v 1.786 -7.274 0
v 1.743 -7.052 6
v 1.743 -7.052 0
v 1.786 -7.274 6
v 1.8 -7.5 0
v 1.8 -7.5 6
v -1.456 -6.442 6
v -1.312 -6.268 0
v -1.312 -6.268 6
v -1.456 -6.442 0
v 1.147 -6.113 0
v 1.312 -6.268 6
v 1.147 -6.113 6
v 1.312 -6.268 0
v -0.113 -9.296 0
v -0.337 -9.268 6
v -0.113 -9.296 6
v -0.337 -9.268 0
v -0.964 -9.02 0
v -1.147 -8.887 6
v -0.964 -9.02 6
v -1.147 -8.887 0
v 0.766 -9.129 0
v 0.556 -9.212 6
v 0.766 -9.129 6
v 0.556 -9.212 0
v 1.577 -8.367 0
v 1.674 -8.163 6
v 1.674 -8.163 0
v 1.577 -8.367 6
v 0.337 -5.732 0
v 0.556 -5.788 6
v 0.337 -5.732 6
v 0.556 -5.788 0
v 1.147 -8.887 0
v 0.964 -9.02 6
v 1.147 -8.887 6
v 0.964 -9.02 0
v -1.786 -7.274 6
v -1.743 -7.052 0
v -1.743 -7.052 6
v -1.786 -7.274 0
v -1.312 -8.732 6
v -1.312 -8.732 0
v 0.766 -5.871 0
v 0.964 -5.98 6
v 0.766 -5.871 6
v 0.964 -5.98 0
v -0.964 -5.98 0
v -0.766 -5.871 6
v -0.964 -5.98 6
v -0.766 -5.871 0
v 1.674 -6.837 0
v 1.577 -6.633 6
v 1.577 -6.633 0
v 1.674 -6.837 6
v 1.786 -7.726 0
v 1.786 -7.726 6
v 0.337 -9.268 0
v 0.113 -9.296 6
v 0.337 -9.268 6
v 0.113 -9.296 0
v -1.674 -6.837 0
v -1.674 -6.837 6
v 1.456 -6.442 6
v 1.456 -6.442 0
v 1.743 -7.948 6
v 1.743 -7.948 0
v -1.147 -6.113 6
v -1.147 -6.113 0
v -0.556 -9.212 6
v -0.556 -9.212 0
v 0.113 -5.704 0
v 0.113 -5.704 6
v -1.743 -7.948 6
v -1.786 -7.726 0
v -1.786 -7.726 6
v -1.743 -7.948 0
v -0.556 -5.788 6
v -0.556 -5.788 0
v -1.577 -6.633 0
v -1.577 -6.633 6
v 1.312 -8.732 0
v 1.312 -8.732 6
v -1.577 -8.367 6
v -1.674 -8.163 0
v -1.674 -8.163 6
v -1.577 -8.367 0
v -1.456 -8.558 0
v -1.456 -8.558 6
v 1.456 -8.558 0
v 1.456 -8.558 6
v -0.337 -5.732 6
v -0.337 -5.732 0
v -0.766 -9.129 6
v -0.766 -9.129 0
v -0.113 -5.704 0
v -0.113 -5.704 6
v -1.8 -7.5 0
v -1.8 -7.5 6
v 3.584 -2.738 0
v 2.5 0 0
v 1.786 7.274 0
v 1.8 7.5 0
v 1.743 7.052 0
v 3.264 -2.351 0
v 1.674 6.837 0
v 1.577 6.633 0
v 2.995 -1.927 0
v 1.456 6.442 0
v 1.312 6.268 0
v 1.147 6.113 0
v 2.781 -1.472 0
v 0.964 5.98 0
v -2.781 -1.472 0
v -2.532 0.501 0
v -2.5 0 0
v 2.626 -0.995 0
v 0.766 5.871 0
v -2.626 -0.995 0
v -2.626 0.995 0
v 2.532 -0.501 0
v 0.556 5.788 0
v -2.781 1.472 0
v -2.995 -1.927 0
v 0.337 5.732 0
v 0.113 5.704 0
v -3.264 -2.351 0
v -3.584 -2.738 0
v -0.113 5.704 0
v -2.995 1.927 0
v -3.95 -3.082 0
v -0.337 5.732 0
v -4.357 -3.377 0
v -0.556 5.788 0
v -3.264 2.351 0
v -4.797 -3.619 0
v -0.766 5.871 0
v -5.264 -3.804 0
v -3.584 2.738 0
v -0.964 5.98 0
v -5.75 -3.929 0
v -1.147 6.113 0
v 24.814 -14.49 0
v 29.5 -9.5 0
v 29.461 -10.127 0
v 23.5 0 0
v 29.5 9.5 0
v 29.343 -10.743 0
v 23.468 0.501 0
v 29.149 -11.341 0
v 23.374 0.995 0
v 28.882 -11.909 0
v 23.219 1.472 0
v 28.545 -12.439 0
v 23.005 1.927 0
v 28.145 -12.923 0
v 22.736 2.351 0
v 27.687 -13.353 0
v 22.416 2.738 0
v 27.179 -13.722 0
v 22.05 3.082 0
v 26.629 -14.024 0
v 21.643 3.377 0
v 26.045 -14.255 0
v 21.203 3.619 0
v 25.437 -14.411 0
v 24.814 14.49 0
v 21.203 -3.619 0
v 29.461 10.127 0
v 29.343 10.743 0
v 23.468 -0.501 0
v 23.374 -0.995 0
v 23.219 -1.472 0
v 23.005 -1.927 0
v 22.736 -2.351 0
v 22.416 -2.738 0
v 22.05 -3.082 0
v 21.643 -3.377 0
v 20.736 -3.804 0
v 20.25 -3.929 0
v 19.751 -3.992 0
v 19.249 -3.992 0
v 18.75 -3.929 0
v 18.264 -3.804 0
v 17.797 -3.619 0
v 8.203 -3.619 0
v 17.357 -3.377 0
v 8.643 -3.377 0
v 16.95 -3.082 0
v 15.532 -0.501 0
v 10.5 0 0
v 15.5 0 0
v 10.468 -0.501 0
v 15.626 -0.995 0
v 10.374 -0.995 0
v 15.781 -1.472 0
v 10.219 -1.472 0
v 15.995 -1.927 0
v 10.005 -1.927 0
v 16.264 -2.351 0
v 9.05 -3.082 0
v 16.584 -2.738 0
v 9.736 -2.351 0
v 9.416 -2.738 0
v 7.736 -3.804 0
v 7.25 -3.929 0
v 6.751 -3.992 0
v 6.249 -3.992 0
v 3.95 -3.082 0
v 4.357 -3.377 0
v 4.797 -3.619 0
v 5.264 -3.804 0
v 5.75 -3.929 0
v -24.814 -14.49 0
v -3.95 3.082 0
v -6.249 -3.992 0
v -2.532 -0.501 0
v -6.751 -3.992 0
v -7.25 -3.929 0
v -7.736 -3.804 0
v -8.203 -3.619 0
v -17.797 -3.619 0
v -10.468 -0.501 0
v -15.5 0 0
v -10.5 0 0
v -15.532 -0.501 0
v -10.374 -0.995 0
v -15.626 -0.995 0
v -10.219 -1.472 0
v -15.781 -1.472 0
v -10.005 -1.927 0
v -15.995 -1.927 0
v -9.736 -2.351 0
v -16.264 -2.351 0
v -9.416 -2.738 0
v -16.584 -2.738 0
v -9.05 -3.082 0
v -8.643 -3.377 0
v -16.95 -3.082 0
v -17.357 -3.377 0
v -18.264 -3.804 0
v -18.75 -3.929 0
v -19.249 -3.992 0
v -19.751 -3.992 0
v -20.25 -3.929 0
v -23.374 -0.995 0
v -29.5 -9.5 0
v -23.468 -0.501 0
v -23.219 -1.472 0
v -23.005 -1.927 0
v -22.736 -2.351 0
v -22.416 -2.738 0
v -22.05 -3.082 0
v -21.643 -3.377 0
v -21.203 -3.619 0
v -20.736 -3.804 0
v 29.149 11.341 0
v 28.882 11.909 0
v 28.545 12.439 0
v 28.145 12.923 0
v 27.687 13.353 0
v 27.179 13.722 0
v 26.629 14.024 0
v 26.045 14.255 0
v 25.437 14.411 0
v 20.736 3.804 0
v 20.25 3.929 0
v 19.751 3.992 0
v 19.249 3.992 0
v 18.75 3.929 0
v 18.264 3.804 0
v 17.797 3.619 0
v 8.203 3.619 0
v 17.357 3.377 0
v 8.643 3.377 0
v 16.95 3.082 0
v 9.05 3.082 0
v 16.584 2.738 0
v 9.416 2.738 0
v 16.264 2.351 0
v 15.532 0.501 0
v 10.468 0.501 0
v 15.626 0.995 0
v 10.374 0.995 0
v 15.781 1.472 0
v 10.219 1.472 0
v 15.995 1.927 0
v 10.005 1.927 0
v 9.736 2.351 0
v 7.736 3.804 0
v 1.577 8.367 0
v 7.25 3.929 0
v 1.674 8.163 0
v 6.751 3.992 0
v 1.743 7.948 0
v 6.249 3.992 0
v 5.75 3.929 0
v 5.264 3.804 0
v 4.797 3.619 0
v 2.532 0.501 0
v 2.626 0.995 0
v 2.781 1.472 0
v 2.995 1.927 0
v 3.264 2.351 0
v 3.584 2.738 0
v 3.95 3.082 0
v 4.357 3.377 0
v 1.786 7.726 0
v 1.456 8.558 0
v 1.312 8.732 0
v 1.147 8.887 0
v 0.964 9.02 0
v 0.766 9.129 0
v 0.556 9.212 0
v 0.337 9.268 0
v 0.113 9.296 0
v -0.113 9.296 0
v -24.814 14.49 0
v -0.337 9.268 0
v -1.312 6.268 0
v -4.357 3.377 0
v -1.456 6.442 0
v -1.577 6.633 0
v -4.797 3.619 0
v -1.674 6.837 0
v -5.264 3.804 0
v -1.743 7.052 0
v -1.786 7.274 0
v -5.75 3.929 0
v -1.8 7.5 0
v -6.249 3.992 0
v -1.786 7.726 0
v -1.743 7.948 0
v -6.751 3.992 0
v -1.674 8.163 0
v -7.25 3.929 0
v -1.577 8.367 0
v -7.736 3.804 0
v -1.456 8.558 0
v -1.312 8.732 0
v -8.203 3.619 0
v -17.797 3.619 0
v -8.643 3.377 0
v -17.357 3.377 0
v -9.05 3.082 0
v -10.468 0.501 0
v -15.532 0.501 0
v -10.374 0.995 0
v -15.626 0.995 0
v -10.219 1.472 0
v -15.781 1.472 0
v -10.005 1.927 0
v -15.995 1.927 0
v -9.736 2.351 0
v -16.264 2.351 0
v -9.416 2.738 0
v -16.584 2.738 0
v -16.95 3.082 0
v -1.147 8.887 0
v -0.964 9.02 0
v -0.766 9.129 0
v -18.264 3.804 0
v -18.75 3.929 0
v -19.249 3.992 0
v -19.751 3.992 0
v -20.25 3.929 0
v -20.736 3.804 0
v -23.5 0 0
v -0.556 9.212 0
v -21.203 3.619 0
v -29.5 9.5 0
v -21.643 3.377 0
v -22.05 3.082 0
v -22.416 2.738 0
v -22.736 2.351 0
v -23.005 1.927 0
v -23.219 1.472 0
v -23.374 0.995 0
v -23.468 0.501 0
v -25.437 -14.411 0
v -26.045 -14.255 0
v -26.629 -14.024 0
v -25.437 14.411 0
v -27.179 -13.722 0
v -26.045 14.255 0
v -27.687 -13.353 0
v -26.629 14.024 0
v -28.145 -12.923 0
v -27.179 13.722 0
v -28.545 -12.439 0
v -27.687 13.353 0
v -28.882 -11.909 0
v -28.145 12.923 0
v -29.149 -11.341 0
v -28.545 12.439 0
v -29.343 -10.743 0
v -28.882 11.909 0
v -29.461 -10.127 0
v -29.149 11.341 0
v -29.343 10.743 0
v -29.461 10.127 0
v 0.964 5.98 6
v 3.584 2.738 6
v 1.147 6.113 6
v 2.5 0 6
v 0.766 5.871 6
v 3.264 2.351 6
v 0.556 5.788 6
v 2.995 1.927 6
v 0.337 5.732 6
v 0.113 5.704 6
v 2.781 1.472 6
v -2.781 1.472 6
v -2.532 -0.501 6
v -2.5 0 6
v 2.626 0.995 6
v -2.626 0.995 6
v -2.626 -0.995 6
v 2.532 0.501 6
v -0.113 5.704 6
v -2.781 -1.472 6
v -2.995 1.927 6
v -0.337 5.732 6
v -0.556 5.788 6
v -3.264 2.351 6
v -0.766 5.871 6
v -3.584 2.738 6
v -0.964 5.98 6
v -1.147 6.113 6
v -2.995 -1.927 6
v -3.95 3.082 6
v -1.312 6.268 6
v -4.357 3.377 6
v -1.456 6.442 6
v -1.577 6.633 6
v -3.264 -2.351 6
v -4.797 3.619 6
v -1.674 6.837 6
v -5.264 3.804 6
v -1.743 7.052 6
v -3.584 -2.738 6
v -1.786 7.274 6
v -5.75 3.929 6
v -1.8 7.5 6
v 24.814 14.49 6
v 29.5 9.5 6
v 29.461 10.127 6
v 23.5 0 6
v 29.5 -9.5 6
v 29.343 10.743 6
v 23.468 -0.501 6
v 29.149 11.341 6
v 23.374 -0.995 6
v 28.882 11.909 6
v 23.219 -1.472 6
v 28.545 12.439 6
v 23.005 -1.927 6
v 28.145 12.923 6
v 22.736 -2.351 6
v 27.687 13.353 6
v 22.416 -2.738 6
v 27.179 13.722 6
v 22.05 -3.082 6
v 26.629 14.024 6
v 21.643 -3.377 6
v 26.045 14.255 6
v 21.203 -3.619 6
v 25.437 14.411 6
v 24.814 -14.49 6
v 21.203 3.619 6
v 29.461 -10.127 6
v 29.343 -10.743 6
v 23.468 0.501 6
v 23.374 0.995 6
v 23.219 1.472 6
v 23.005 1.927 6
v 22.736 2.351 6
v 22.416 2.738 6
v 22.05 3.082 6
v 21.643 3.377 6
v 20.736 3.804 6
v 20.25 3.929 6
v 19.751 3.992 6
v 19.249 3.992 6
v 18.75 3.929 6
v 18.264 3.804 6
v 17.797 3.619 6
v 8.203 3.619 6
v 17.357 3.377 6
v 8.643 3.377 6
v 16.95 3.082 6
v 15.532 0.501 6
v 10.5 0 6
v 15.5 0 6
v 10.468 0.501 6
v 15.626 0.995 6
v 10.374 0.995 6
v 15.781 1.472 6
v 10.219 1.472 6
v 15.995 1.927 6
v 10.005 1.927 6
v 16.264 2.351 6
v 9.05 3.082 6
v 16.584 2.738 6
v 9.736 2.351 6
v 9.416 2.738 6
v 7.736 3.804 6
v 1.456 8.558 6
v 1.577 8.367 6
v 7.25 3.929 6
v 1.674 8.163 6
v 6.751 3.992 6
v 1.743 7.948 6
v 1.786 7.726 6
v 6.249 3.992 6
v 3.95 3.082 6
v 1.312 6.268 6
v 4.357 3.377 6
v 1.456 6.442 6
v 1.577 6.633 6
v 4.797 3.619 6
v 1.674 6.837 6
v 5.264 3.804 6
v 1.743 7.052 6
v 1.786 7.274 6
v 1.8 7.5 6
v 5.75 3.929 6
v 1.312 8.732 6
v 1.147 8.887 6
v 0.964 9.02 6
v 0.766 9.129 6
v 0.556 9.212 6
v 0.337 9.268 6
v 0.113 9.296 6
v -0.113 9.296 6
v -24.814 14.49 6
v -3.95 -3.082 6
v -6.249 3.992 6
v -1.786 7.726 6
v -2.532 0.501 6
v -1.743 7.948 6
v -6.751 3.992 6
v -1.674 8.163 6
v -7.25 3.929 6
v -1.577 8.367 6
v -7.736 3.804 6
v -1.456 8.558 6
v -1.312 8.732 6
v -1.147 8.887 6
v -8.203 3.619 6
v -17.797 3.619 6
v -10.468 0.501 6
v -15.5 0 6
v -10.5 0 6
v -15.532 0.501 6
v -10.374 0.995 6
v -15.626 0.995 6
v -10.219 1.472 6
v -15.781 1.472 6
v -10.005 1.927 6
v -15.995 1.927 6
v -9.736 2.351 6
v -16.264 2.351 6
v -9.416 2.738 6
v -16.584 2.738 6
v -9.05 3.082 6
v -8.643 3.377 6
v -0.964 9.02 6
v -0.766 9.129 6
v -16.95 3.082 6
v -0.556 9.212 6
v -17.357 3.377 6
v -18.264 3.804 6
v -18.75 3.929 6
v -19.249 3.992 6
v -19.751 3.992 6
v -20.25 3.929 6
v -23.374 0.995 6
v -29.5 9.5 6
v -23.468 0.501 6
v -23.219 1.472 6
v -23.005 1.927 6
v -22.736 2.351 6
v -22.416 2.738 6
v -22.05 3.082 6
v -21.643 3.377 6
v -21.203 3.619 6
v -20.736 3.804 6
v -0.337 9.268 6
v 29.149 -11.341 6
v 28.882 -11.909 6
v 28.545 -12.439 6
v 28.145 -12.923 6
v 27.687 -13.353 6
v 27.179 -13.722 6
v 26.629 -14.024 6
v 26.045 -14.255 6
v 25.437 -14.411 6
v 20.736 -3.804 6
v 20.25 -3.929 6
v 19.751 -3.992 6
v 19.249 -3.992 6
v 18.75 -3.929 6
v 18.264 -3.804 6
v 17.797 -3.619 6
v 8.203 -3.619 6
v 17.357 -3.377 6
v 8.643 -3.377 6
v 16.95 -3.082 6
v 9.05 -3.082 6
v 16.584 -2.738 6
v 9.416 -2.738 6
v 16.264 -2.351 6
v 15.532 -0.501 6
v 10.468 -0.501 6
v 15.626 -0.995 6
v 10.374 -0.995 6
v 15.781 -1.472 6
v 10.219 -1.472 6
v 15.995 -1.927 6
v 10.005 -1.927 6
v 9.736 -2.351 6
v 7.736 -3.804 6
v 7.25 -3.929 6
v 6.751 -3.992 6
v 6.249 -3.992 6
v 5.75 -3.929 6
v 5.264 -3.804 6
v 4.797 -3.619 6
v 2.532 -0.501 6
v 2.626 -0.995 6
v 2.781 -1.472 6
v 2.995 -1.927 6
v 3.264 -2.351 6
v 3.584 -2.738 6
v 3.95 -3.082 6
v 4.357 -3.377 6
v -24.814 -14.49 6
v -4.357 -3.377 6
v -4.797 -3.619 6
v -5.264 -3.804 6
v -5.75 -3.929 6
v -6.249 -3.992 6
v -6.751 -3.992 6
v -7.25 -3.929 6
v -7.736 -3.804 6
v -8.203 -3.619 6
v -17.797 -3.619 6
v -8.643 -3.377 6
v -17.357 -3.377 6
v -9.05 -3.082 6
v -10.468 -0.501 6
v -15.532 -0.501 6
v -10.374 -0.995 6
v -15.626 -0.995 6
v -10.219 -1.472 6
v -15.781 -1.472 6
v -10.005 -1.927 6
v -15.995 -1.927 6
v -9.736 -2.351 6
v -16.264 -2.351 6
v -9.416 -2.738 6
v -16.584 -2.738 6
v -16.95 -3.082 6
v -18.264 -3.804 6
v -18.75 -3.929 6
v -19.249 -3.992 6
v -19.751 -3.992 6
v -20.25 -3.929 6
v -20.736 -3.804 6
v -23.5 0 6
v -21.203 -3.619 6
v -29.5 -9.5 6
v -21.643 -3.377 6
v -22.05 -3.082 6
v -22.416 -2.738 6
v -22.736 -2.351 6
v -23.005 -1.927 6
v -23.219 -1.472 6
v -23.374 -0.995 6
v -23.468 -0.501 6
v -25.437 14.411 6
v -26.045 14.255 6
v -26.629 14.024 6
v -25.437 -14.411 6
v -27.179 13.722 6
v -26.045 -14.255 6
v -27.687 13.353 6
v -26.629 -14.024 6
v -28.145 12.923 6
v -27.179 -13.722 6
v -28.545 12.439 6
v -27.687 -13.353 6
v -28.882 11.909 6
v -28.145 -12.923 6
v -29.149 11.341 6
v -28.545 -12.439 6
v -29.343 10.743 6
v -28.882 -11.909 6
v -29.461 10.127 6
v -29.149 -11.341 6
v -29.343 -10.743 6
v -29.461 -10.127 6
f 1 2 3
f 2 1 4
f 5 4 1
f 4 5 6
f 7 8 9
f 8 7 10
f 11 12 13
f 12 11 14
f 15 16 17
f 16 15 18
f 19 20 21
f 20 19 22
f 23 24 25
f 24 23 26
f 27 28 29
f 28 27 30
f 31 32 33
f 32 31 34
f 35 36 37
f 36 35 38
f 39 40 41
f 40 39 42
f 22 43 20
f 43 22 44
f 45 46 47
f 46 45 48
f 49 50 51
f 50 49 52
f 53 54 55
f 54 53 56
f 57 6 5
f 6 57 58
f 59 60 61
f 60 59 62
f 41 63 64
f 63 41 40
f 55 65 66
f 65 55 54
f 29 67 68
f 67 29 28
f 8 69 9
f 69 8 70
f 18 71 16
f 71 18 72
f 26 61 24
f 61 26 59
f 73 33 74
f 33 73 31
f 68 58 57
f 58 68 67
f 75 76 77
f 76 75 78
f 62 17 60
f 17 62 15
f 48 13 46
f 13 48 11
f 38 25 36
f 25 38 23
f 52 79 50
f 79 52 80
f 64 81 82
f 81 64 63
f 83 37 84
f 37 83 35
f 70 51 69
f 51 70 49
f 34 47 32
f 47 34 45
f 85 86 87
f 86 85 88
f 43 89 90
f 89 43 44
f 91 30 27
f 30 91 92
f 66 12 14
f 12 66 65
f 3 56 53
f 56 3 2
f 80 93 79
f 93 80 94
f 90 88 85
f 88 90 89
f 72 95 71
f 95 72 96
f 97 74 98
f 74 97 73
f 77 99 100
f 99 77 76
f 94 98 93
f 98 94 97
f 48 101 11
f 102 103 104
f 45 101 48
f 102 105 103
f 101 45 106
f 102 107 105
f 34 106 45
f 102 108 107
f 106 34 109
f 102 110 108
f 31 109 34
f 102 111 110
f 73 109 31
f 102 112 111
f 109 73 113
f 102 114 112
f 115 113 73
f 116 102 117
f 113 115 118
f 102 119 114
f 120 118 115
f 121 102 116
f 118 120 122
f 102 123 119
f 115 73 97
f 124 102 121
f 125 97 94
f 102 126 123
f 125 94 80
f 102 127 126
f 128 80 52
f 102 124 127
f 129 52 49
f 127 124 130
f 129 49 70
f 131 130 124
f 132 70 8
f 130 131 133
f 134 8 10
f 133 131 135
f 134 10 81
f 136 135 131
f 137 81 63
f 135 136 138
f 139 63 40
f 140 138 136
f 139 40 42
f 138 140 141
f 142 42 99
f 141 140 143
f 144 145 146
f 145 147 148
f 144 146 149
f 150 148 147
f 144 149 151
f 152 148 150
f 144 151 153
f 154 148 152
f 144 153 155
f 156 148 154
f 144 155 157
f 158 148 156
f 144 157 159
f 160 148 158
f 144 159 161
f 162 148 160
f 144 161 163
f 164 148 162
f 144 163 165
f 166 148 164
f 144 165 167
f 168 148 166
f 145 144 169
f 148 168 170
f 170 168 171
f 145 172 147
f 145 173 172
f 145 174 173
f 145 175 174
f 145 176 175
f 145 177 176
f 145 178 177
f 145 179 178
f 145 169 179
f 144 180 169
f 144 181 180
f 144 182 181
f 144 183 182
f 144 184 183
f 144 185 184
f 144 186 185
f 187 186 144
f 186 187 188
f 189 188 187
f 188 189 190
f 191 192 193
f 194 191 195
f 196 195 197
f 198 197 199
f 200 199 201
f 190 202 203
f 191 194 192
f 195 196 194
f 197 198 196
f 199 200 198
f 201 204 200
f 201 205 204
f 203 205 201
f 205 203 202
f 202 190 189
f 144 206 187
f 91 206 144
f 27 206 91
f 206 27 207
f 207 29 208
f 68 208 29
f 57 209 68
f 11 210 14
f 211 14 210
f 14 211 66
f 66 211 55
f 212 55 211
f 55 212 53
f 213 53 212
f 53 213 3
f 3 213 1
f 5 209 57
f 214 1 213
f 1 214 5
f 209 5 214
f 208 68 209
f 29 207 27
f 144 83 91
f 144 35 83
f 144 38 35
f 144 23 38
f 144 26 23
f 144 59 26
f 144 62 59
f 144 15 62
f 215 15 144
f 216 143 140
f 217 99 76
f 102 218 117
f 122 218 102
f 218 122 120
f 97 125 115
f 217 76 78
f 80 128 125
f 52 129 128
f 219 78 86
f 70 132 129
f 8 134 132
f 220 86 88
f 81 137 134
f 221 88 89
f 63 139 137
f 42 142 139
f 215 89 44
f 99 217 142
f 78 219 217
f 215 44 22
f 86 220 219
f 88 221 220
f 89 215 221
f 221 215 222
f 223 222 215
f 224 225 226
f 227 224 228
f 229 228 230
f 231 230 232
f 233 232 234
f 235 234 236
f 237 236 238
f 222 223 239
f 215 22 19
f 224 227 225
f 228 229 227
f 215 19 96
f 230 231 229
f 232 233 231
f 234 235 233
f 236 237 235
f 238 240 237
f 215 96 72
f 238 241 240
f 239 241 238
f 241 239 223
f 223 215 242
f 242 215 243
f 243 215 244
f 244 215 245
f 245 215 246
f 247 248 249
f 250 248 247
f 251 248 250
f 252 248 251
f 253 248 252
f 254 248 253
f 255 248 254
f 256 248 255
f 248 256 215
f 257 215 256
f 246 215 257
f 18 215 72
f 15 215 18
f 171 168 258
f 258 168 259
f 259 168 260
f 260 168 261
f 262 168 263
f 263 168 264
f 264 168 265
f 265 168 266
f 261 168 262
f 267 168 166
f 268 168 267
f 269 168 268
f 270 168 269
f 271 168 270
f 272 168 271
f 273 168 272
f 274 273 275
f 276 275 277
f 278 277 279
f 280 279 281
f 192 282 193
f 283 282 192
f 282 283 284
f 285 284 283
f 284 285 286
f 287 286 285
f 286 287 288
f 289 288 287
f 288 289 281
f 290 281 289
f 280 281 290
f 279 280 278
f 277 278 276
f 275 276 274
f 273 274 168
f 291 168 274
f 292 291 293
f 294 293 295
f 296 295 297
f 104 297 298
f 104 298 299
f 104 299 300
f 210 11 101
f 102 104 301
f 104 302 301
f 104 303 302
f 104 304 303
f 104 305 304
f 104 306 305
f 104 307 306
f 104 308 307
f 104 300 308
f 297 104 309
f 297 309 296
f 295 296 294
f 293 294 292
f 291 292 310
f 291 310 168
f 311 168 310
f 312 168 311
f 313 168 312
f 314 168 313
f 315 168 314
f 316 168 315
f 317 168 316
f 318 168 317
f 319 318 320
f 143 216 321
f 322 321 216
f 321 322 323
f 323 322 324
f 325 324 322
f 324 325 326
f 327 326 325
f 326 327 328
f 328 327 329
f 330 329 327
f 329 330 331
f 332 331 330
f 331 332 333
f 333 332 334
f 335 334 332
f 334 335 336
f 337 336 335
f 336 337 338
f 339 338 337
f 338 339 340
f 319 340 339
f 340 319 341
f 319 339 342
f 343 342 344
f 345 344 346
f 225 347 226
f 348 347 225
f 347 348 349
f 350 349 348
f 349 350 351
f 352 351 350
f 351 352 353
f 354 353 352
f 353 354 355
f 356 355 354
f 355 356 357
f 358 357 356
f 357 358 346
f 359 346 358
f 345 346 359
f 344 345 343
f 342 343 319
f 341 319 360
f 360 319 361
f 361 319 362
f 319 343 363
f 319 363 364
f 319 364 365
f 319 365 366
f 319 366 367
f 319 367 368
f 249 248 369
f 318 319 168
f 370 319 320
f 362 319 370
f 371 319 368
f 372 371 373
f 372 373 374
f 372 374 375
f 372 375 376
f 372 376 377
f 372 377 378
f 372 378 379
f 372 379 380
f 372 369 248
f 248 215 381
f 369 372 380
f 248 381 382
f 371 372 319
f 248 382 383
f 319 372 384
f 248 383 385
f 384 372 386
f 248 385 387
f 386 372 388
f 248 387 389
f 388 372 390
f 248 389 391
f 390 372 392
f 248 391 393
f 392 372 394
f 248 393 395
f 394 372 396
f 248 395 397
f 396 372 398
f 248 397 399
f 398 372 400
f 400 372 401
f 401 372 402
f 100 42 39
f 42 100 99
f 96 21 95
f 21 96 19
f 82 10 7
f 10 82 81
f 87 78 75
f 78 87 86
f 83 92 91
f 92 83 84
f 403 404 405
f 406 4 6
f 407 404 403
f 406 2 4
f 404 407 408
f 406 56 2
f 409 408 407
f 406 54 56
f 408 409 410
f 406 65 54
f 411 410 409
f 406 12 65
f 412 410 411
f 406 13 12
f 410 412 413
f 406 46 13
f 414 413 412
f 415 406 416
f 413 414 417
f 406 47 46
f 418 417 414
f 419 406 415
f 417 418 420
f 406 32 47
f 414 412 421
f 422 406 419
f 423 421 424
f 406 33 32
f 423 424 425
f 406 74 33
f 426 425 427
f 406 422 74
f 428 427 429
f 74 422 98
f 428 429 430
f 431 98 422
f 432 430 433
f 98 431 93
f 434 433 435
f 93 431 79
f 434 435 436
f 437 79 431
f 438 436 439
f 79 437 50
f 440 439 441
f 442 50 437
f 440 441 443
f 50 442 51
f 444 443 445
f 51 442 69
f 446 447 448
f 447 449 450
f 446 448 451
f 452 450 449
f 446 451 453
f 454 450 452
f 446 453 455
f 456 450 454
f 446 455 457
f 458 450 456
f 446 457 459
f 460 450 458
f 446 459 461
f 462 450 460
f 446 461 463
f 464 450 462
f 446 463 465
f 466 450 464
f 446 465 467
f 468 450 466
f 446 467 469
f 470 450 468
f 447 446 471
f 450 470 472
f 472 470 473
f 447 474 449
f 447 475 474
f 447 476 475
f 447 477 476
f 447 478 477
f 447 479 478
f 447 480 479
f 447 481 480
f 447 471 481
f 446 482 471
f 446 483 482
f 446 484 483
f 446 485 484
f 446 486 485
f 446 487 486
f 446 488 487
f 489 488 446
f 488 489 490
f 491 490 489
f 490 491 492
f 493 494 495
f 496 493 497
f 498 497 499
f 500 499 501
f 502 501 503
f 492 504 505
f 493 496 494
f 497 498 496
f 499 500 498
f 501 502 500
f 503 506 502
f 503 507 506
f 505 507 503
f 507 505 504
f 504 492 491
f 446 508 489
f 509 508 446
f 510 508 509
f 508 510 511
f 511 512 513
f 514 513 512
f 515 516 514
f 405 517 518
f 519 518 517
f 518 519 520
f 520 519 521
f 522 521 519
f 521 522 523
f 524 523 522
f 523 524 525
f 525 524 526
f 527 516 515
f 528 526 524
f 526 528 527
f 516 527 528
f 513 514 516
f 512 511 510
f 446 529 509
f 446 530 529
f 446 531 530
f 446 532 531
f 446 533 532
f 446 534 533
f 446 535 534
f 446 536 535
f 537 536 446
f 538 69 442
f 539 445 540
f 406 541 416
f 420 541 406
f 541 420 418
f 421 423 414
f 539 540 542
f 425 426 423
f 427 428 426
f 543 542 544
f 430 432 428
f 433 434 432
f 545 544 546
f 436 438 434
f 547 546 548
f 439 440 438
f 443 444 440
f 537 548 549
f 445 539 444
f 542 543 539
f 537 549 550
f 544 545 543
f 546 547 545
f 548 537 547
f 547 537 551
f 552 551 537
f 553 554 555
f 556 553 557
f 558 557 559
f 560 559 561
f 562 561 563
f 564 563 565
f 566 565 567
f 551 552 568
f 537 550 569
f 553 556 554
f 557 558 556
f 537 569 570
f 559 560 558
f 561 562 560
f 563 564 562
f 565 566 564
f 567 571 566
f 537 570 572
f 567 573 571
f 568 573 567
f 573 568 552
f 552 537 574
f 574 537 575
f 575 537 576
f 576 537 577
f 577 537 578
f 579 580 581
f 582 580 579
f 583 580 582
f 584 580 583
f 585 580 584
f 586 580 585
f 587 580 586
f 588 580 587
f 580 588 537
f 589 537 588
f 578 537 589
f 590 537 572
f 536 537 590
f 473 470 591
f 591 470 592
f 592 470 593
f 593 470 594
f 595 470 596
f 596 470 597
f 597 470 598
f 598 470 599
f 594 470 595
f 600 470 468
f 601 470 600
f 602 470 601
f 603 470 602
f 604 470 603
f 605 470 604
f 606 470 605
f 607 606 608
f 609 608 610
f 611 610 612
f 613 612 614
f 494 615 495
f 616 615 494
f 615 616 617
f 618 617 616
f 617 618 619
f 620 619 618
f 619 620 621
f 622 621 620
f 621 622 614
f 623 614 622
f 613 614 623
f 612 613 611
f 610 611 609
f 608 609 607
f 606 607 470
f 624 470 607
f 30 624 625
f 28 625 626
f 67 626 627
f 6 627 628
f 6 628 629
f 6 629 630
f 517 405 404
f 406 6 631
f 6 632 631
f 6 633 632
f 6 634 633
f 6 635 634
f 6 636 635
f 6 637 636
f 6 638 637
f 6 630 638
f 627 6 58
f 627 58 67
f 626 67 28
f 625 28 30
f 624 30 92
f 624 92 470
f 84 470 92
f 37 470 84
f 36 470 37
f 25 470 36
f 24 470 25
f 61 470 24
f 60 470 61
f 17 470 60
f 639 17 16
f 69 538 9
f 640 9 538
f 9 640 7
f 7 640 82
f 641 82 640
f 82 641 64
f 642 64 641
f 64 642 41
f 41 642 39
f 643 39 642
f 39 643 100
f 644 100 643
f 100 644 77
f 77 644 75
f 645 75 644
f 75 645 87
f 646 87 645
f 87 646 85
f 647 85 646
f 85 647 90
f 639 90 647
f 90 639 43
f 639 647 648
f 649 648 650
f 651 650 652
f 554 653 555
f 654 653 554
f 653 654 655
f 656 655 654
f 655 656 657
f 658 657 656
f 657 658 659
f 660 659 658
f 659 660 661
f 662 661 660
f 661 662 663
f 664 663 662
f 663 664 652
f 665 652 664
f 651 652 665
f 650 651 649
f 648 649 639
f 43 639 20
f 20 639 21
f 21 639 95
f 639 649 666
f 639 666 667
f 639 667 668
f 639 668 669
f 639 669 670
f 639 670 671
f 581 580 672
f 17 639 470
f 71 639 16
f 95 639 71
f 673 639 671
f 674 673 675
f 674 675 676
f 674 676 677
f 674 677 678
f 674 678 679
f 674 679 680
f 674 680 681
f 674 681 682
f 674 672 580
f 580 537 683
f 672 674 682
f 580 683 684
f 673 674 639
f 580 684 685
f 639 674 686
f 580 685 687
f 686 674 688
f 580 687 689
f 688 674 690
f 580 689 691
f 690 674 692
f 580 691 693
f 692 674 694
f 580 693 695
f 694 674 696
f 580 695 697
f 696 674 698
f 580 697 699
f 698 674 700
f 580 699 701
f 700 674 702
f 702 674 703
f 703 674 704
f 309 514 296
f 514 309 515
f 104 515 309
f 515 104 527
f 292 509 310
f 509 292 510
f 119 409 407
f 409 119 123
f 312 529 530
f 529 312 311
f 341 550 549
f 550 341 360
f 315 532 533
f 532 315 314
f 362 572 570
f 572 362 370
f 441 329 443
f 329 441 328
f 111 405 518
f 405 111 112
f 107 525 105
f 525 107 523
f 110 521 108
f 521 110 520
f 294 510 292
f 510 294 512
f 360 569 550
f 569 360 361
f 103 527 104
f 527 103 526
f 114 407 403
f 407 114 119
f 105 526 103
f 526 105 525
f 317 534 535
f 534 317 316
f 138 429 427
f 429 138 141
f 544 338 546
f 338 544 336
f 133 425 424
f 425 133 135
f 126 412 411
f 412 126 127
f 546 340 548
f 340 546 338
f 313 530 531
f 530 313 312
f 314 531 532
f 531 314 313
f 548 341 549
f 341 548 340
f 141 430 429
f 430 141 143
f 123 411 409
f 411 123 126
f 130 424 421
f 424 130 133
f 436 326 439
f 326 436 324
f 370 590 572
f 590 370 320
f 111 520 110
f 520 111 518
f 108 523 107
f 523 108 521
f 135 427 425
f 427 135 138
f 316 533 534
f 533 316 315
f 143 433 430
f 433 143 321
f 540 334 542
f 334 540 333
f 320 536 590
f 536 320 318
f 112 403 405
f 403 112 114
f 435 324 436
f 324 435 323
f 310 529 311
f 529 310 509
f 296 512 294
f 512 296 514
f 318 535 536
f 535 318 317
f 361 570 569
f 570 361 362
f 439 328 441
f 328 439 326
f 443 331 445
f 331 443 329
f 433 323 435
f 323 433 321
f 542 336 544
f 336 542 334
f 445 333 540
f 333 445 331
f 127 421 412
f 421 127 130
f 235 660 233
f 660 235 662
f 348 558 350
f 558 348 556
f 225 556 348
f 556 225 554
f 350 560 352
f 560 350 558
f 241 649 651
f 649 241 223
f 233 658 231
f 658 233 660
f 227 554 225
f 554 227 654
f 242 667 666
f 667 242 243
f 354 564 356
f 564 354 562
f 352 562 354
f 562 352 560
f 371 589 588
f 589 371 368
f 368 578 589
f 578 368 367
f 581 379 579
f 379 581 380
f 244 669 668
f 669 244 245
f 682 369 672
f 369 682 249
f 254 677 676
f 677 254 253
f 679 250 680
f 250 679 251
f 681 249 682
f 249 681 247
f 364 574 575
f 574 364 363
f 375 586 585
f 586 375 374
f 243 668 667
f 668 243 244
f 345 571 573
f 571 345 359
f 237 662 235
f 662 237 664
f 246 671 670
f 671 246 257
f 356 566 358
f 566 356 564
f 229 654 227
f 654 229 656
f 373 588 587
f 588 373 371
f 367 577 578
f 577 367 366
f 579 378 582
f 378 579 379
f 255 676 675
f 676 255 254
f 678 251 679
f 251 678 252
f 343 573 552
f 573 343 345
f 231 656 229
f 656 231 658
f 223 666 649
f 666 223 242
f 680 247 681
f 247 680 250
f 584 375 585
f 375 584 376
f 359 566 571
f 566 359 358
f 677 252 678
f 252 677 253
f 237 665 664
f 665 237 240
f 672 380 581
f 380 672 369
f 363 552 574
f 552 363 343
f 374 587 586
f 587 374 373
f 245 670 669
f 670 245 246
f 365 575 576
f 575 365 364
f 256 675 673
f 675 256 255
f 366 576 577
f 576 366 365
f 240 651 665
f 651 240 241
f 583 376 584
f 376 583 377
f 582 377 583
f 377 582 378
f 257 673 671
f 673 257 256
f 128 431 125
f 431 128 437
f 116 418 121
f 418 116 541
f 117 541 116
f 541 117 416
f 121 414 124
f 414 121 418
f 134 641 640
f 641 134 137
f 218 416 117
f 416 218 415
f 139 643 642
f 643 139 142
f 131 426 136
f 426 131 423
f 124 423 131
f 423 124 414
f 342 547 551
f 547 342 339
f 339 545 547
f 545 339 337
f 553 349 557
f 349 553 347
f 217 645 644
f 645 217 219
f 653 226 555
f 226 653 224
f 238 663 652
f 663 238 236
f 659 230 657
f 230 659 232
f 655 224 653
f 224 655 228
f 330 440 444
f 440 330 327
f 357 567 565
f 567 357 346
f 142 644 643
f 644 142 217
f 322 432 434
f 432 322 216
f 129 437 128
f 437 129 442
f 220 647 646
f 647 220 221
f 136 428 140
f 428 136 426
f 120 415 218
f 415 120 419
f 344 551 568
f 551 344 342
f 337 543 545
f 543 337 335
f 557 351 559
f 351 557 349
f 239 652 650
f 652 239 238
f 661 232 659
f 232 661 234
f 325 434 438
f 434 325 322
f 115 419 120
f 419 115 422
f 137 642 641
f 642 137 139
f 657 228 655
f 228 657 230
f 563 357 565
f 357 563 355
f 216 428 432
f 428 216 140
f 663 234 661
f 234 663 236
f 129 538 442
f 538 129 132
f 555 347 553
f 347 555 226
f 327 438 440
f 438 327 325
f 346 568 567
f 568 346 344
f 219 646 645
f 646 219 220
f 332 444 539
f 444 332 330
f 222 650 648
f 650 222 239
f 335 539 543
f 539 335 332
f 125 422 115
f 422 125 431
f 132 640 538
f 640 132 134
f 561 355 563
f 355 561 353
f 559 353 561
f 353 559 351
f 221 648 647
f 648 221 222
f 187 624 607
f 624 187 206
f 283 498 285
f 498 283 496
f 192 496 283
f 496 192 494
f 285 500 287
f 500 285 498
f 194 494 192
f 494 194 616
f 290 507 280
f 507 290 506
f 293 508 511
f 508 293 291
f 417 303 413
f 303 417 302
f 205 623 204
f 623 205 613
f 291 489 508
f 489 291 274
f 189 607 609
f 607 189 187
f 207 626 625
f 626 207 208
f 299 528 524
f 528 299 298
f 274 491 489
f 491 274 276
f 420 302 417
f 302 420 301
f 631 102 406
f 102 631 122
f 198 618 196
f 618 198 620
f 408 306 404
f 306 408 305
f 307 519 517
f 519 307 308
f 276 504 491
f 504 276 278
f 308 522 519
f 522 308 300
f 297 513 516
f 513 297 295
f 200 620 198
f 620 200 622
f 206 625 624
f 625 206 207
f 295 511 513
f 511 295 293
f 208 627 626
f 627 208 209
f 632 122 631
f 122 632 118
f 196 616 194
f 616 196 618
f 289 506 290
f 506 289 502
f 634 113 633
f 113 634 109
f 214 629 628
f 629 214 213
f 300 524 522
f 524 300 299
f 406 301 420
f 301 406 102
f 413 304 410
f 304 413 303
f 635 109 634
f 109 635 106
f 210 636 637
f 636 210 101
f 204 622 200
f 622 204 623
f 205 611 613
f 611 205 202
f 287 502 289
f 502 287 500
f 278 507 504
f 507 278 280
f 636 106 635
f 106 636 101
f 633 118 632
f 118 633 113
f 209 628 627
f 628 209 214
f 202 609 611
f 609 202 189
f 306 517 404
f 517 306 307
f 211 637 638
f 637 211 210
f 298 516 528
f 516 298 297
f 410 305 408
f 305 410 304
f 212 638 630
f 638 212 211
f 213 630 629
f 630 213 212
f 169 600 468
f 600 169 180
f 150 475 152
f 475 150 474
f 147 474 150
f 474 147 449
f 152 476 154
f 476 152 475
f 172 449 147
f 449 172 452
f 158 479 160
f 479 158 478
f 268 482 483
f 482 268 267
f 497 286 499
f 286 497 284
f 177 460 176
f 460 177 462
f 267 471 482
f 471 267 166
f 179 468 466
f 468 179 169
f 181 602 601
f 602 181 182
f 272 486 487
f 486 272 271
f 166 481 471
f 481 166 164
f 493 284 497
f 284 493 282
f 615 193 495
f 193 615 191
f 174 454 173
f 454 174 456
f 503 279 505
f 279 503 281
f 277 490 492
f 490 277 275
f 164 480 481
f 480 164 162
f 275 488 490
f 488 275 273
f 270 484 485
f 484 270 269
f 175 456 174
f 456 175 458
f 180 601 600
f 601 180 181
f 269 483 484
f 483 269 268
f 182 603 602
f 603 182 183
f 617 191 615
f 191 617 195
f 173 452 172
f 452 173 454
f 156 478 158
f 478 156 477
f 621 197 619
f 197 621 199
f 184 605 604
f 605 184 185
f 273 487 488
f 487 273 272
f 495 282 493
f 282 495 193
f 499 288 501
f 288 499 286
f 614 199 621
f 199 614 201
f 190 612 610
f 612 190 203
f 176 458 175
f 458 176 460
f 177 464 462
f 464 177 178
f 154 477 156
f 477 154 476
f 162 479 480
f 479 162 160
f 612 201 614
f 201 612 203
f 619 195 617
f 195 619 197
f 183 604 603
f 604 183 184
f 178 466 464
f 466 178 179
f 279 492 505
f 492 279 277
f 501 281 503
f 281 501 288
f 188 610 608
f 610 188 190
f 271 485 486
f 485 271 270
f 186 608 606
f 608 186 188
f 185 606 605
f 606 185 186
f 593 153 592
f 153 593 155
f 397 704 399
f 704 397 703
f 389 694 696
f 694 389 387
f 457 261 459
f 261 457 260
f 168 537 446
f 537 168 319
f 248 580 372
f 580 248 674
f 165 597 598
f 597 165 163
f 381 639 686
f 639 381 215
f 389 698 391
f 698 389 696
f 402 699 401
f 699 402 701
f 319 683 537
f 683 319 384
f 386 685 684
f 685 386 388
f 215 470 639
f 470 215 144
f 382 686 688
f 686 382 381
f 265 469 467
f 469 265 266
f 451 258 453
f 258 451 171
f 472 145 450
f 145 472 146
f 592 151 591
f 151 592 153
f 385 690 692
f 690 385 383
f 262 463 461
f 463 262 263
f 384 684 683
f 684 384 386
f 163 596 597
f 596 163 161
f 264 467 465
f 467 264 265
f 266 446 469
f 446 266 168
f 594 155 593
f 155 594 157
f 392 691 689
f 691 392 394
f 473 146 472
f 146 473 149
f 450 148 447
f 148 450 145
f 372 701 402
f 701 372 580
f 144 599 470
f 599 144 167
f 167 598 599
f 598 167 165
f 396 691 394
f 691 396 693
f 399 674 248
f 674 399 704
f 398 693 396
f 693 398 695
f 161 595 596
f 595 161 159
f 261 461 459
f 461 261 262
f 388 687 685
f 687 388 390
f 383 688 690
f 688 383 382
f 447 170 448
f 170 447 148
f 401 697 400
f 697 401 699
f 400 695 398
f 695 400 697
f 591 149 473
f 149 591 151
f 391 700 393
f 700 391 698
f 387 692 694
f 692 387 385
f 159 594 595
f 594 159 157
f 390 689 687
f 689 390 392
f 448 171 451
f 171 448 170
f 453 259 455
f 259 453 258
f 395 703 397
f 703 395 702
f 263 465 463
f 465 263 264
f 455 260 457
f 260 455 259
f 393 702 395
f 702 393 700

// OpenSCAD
$fn = 50;

difference() {
	union() {
		hull() {
			translate(v = [-24.5, 9.5, 0]) {
				cylinder(h = 6, r = 5);
			}
			translate(v = [24.5, 9.5, 0]) {
				cylinder(h = 6, r = 5);
			}
			translate(v = [-24.5, -9.5, 0]) {
				cylinder(h = 6, r = 5);
			}
			translate(v = [24.5, -9.5, 0]) {
				cylinder(h = 6, r = 5);
			}
		}
	}
	union() {
		translate(v = [0.0, -7.5, 0]) {
			cylinder(h = 6, r = 1.8);
		}
		translate(v = [0.0, 7.5, 0]) {
			cylinder(h = 6, r = 1.8);
		}
		translate(v = [-19.5, 0, 0.0]) {
			cylinder(h = 6, r = 4.0);
		}
		translate(v = [-6.5, 0, 0.0]) {
			cylinder(h = 6, r = 4.0);
		}
		translate(v = [6.5, 0, 0.0]) {
			cylinder(h = 6, r = 4.0);
		}
		translate(v = [19.5, 0, 0.0]) {
			cylinder(h = 6, r = 4.0);
		}
	}
}
